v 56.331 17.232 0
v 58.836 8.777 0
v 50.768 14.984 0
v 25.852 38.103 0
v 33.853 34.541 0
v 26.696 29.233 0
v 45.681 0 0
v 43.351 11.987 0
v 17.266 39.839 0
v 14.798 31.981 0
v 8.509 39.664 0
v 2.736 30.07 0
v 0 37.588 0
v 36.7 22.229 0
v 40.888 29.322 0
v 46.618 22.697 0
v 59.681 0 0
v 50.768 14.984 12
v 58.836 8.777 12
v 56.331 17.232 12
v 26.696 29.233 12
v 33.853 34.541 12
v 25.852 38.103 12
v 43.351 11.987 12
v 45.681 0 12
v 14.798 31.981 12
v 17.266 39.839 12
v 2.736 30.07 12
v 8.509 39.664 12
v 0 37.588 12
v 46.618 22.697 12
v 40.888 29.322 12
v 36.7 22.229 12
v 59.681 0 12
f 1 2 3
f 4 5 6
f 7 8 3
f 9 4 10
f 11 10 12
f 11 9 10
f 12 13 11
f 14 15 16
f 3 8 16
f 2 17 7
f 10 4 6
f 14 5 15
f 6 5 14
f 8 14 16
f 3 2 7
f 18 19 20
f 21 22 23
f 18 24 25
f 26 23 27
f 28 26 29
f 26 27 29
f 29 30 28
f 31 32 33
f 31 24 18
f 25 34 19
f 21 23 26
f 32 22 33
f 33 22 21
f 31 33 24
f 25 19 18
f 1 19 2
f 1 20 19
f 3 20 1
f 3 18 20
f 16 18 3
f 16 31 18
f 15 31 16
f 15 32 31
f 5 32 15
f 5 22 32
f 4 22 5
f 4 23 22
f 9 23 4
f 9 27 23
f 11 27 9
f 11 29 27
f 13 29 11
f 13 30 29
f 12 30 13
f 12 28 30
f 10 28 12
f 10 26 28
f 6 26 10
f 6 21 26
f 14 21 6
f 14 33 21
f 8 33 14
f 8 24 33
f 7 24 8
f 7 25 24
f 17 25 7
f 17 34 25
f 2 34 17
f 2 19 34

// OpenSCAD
$fn = 32;

// ----------------------------------------------------------------------
// Arc stop: segment, 12 mm thick
// ----------------------------------------------------------------------

// --- parameters (mm) ---
profile_height = 12;      // extrusion height
profile_points = 17;      // points of the closed outline

profile = [[59.681, 0], [58.836, 8.777], [56.331, 17.232], [50.768, 14.984], [46.618, 22.697], [40.888, 29.322], [33.853, 34.541], [25.852, 38.103], [17.266, 39.839], [8.509, 39.664], [0, 37.588], [2.736, 30.07], [14.798, 31.981], [26.696, 29.233], [36.7, 22.229], [43.351, 11.987], [45.681, 0]];  // single closed polygon, 17 points, counter clockwise

// --- the one profile operation ---
linear_extrude(height = profile_height) polygon(points = profile);
